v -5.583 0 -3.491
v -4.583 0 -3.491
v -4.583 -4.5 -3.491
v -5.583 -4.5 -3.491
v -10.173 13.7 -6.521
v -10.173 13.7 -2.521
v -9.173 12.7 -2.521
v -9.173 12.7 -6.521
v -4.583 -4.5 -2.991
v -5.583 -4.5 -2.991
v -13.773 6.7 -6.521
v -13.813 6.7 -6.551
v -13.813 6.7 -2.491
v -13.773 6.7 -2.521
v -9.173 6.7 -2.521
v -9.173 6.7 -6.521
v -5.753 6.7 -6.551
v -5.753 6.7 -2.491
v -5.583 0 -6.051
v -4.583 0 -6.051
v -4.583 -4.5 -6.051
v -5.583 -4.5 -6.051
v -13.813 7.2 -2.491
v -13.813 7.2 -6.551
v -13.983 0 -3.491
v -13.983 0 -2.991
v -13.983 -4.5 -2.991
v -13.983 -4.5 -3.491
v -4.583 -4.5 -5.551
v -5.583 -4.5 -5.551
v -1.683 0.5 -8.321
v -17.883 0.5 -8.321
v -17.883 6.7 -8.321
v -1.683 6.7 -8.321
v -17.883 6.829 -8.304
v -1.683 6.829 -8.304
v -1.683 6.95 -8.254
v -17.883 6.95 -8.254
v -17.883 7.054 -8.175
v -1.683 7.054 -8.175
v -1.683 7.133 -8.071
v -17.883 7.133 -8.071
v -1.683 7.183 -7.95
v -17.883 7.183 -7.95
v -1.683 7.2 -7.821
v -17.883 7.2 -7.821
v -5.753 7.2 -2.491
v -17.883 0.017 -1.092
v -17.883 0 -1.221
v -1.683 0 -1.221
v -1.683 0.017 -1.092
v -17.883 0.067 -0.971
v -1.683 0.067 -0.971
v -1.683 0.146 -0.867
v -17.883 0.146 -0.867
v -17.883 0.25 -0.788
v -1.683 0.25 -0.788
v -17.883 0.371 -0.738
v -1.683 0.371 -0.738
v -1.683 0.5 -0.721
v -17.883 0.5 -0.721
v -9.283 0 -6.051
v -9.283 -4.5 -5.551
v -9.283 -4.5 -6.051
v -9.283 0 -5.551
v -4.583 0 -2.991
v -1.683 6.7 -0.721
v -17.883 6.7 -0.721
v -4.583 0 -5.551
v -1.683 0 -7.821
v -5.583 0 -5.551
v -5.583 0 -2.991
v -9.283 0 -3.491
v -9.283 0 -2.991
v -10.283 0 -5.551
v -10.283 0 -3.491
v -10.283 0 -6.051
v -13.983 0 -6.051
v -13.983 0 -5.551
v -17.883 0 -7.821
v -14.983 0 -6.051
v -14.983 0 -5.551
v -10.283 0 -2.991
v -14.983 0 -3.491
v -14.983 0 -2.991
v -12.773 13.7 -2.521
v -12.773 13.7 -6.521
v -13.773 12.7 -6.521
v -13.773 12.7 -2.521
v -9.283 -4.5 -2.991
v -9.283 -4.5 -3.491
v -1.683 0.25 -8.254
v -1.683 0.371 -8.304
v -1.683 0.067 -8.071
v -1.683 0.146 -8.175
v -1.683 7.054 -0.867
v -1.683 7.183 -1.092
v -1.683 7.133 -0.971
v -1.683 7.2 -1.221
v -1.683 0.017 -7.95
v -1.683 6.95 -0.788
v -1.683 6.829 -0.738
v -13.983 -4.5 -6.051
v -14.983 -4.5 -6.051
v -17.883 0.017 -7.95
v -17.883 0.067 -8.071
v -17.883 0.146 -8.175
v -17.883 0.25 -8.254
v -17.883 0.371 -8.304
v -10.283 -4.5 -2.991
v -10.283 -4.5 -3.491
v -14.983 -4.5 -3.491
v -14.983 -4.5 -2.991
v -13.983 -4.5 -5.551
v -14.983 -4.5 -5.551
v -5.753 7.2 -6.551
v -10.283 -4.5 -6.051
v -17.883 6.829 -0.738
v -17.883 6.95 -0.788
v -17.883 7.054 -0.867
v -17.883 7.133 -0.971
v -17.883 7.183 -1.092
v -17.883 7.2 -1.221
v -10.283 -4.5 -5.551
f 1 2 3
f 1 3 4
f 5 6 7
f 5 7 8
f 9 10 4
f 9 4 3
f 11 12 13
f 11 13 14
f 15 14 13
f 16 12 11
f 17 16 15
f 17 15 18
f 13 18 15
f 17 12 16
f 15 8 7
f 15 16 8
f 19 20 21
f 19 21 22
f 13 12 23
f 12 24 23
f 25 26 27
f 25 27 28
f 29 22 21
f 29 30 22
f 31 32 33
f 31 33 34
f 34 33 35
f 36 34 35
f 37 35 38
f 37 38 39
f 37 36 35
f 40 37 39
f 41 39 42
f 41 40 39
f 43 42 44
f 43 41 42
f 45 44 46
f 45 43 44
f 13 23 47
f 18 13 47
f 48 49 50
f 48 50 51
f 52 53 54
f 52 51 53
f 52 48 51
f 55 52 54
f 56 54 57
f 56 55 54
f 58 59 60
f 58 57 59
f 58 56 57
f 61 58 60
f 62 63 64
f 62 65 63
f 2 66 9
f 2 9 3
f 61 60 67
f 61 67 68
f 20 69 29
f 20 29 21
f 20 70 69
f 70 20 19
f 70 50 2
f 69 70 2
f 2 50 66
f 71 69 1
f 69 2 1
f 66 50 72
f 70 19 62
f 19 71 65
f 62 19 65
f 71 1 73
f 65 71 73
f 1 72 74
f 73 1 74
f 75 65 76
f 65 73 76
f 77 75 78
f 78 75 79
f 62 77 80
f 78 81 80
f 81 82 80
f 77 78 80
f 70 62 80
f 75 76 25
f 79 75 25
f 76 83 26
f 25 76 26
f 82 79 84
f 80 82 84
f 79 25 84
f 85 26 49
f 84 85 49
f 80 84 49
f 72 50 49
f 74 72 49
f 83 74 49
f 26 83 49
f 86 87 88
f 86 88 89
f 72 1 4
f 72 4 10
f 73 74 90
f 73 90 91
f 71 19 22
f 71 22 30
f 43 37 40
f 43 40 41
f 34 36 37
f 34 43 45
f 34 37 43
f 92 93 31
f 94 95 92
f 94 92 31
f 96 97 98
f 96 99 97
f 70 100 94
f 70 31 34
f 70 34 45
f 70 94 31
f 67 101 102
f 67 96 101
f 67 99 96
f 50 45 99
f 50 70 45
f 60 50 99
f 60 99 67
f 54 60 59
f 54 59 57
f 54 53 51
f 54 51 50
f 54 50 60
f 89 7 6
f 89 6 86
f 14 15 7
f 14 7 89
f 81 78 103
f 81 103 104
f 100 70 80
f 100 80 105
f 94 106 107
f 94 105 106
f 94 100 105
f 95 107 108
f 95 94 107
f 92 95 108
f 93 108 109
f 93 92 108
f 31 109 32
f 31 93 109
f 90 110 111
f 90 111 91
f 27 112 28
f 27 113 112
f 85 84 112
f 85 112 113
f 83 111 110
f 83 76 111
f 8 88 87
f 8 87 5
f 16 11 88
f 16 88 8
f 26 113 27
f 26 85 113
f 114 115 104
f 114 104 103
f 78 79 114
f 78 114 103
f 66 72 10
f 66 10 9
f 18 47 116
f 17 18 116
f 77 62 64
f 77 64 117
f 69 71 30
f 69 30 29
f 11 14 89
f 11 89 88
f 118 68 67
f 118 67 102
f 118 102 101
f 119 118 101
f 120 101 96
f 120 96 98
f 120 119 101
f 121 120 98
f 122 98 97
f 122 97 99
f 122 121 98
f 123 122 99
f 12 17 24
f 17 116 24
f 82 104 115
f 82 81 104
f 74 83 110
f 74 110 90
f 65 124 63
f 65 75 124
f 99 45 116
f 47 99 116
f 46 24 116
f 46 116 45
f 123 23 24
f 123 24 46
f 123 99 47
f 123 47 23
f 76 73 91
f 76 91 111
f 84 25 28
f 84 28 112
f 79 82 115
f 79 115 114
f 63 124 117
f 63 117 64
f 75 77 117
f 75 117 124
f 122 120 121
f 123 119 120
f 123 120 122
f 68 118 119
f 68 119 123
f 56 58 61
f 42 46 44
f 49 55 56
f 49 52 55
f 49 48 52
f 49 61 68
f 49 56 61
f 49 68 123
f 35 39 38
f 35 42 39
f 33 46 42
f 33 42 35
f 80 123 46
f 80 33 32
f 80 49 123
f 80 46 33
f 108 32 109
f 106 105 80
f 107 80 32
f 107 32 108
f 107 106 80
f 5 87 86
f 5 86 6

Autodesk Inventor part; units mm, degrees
ref_plane "YZ Plane" through (0, 0, 0) normal (1, 0, 0) x (0, 1, 0)
ref_plane "XZ Plane" through (0, 0, 0) normal (0, 1, 0) x (-1, 0, 0)
ref_plane "XY Plane" through (0, 0, 0) normal (0, 0, 1) x (1, 0, 0)
sketch "Sketch1" plane through (0, 0, 0) normal (0, 1, 0) x (-1, 0, 0)
  line L0 (17.8833, -8.321) -> (1.6833, -8.321)
  line L1 (1.6833, -8.321) -> (1.6833, -0.721)
  line L2 (1.6833, -0.721) -> (17.8833, -0.721)
  line L3 (17.8833, -0.721) -> (17.8833, -8.321)
  dimension "d23" = 16.2
extrude "Extrusion5" add sketch "Sketch1" along normal blind 7.2
fillet "Fillet2" radius 0.5 4 edges at (-9.7833, 7.2, -0.721) (-9.7833, 7.2, -8.321) (-9.7833, 0, -0.721) (-9.7833, 0, -8.321)
sketch "Sketch7" plane through (0, 7.2, 0) normal (0, 1, 0) x (1, 0, 0)
  line L0 (-17.8833, 7.821) -> (-1.6833, 7.821) projected
  line L1 (-17.8833, 7.821) -> (-17.8833, 1.221) projected
  line L2 (-1.6833, 1.221) -> (-17.8833, 1.221) projected
  line L3 (-1.6833, 1.221) -> (-1.6833, 7.821) projected
  line L4 (-13.8133, 2.491) -> (-5.7533, 2.491)
  line L5 (-5.7533, 2.491) -> (-5.7533, 6.551)
  line L6 (-5.7533, 6.551) -> (-13.8133, 6.551)
  line L7 (-13.8133, 6.551) -> (-13.8133, 2.491)
  line L8 (-13.8133, 2.491) -> (-5.7533, 6.551) construction
  line L9 (-5.7533, 2.491) -> (-13.8133, 6.551) construction
  point P0 (0, 0)
  point P1 (-9.7833, 4.521)
  dimension "d28" = 8.06
  dimension "d29" = 4.06
extrude "Extrusion6" cut sketch "Sketch7" against normal blind 0.5 contours L7 L6 L5 L4
sketch "Sketch8" plane through (0, 6.7, 0) normal (0, 1, 0) x (1, 0, 0)
  line L0 (-13.7727, 6.521) -> (-9.1727, 6.521)
  line L1 (-9.1727, 6.521) -> (-9.1727, 2.521)
  line L2 (-9.1727, 2.521) -> (-13.7727, 2.521)
  line L3 (-13.7727, 2.521) -> (-13.7727, 6.521)
  line L4 (-13.7727, 6.521) -> (-9.1727, 2.521) construction
  line L5 (-9.1727, 6.521) -> (-13.7727, 2.521) construction
  line L6 (-13.8133, 6.551) -> (-5.7533, 6.551) projected
  line L7 (-13.8133, 2.491) -> (-13.8133, 6.551) projected
  line L8 (-5.7533, 2.491) -> (-13.8133, 2.491) projected
  line L9 (-5.7533, 6.551) -> (-5.7533, 2.491) projected
  point P0 (0, 0)
  point P1 (-11.4727, 4.521)
  dimension "d32" = 4.6
  dimension "d33" = 4
  dimension "d34" = 2.03
extrude "Extrusion7" add sketch "Sketch8" along normal blind 7 contours L0 L1 L2 L3
chamfer "Chamfer1" distance 1 angle 45 2 edges at (-9.1727, 13.7, -4.521) (-13.7727, 13.7, -4.521)
sketch "Sketch9" plane through (0, 0, 0) normal (0, -1, 0) x (1, 0, 0)
  line L0 (-1.6833, -7.821) -> (-17.8833, -7.821) projected
  line L1 (-1.6833, -1.221) -> (-1.6833, -7.821) projected
  line L2 (-17.8833, -1.221) -> (-1.6833, -1.221) projected
  line L3 (-17.8833, -7.821) -> (-17.8833, -1.221) projected
  line L4 (-5.5833, -2.991) -> (-4.5833, -2.991)
  line L5 (-4.5833, -2.991) -> (-4.5833, -3.491)
  line L6 (-4.5833, -3.491) -> (-5.5833, -3.491)
  line L7 (-5.5833, -3.491) -> (-5.5833, -2.991)
  line L8 (-5.5833, -2.991) -> (-4.5833, -3.491) construction
  line L9 (-4.5833, -2.991) -> (-5.5833, -3.491) construction
  line L10 (-10.2833, -2.991) -> (-9.2833, -2.991)
  line L11 (-9.2833, -2.991) -> (-9.2833, -3.491)
  line L12 (-9.2833, -3.491) -> (-10.2833, -3.491)
  line L13 (-10.2833, -3.491) -> (-10.2833, -2.991)
  line L14 (-10.2833, -2.991) -> (-9.2833, -3.491) construction
  line L15 (-9.2833, -2.991) -> (-10.2833, -3.491) construction
  line L16 (-14.9833, -2.991) -> (-13.9833, -2.991)
  line L17 (-13.9833, -2.991) -> (-13.9833, -3.491)
  line L18 (-13.9833, -3.491) -> (-14.9833, -3.491)
  line L19 (-14.9833, -3.491) -> (-14.9833, -2.991)
  line L20 (-14.9833, -2.991) -> (-13.9833, -3.491) construction
  line L21 (-13.9833, -2.991) -> (-14.9833, -3.491) construction
  line L22 (-5.5833, -5.551) -> (-4.5833, -5.551)
  line L23 (-4.5833, -5.551) -> (-4.5833, -6.051)
  line L24 (-4.5833, -6.051) -> (-5.5833, -6.051)
  line L25 (-5.5833, -6.051) -> (-5.5833, -5.551)
  line L26 (-5.5833, -5.551) -> (-4.5833, -6.051) construction
  line L27 (-4.5833, -5.551) -> (-5.5833, -6.051) construction
  line L28 (-10.2833, -5.551) -> (-9.2833, -5.551)
  line L29 (-9.2833, -5.551) -> (-9.2833, -6.051)
  line L30 (-9.2833, -6.051) -> (-10.2833, -6.051)
  line L31 (-10.2833, -6.051) -> (-10.2833, -5.551)
  line L32 (-10.2833, -5.551) -> (-9.2833, -6.051) construction
  line L33 (-9.2833, -5.551) -> (-10.2833, -6.051) construction
  line L34 (-14.9833, -5.551) -> (-13.9833, -5.551)
  line L35 (-13.9833, -5.551) -> (-13.9833, -6.051)
  line L36 (-13.9833, -6.051) -> (-14.9833, -6.051)
  line L37 (-14.9833, -6.051) -> (-14.9833, -5.551)
  line L38 (-14.9833, -5.551) -> (-13.9833, -6.051) construction
  line L39 (-13.9833, -5.551) -> (-14.9833, -6.051) construction
  line L40 (-1.6833, -1.221) -> (-17.8833, -1.221) projected
  line L41 (-9.7833, -1.221) -> (-9.7833, -7.821) construction
  line L42 (-17.8833, -7.821) -> (-1.6833, -7.821) projected
  line L43 (-1.6833, -1.221) -> (-1.6833, -7.821) projected
  line L44 (-1.6833, -4.521) -> (-17.8833, -4.521) construction
  line L45 (-17.8833, -7.821) -> (-17.8833, -1.221) projected
  point P0 (0, 0)
  point P1 (-5.0833, -3.241)
  point P2 (-9.7833, -3.241)
  point P3 (-14.4833, -3.241)
  point P4 (-5.0833, -5.801)
  point P5 (-9.7833, -5.801)
  point P6 (-14.4833, -5.801)
  point P7 (-9.7833, -3.241)
  dimension "d40" = 1
  dimension "d41" = 0.5
  dimension "d44" = 4.7
  dimension "d47" = 2.56
  dimension "d50" = 1.28
extrude "Extrusion8" add sketch "Sketch9" along normal blind 4.5 contours L4 L5 L6 L7 | L10 L11 L12 L13 | L16 L17 L18 L19 | L22 L23 L24 L25 | L28 L29 L30 L31 | L34 L35 L36 L37
equation "\"d34\" = 0.5 * d29"
equation "\"d50\" = 0.5 * d47"
properties part number "switch" material "PAEK Plastic"
